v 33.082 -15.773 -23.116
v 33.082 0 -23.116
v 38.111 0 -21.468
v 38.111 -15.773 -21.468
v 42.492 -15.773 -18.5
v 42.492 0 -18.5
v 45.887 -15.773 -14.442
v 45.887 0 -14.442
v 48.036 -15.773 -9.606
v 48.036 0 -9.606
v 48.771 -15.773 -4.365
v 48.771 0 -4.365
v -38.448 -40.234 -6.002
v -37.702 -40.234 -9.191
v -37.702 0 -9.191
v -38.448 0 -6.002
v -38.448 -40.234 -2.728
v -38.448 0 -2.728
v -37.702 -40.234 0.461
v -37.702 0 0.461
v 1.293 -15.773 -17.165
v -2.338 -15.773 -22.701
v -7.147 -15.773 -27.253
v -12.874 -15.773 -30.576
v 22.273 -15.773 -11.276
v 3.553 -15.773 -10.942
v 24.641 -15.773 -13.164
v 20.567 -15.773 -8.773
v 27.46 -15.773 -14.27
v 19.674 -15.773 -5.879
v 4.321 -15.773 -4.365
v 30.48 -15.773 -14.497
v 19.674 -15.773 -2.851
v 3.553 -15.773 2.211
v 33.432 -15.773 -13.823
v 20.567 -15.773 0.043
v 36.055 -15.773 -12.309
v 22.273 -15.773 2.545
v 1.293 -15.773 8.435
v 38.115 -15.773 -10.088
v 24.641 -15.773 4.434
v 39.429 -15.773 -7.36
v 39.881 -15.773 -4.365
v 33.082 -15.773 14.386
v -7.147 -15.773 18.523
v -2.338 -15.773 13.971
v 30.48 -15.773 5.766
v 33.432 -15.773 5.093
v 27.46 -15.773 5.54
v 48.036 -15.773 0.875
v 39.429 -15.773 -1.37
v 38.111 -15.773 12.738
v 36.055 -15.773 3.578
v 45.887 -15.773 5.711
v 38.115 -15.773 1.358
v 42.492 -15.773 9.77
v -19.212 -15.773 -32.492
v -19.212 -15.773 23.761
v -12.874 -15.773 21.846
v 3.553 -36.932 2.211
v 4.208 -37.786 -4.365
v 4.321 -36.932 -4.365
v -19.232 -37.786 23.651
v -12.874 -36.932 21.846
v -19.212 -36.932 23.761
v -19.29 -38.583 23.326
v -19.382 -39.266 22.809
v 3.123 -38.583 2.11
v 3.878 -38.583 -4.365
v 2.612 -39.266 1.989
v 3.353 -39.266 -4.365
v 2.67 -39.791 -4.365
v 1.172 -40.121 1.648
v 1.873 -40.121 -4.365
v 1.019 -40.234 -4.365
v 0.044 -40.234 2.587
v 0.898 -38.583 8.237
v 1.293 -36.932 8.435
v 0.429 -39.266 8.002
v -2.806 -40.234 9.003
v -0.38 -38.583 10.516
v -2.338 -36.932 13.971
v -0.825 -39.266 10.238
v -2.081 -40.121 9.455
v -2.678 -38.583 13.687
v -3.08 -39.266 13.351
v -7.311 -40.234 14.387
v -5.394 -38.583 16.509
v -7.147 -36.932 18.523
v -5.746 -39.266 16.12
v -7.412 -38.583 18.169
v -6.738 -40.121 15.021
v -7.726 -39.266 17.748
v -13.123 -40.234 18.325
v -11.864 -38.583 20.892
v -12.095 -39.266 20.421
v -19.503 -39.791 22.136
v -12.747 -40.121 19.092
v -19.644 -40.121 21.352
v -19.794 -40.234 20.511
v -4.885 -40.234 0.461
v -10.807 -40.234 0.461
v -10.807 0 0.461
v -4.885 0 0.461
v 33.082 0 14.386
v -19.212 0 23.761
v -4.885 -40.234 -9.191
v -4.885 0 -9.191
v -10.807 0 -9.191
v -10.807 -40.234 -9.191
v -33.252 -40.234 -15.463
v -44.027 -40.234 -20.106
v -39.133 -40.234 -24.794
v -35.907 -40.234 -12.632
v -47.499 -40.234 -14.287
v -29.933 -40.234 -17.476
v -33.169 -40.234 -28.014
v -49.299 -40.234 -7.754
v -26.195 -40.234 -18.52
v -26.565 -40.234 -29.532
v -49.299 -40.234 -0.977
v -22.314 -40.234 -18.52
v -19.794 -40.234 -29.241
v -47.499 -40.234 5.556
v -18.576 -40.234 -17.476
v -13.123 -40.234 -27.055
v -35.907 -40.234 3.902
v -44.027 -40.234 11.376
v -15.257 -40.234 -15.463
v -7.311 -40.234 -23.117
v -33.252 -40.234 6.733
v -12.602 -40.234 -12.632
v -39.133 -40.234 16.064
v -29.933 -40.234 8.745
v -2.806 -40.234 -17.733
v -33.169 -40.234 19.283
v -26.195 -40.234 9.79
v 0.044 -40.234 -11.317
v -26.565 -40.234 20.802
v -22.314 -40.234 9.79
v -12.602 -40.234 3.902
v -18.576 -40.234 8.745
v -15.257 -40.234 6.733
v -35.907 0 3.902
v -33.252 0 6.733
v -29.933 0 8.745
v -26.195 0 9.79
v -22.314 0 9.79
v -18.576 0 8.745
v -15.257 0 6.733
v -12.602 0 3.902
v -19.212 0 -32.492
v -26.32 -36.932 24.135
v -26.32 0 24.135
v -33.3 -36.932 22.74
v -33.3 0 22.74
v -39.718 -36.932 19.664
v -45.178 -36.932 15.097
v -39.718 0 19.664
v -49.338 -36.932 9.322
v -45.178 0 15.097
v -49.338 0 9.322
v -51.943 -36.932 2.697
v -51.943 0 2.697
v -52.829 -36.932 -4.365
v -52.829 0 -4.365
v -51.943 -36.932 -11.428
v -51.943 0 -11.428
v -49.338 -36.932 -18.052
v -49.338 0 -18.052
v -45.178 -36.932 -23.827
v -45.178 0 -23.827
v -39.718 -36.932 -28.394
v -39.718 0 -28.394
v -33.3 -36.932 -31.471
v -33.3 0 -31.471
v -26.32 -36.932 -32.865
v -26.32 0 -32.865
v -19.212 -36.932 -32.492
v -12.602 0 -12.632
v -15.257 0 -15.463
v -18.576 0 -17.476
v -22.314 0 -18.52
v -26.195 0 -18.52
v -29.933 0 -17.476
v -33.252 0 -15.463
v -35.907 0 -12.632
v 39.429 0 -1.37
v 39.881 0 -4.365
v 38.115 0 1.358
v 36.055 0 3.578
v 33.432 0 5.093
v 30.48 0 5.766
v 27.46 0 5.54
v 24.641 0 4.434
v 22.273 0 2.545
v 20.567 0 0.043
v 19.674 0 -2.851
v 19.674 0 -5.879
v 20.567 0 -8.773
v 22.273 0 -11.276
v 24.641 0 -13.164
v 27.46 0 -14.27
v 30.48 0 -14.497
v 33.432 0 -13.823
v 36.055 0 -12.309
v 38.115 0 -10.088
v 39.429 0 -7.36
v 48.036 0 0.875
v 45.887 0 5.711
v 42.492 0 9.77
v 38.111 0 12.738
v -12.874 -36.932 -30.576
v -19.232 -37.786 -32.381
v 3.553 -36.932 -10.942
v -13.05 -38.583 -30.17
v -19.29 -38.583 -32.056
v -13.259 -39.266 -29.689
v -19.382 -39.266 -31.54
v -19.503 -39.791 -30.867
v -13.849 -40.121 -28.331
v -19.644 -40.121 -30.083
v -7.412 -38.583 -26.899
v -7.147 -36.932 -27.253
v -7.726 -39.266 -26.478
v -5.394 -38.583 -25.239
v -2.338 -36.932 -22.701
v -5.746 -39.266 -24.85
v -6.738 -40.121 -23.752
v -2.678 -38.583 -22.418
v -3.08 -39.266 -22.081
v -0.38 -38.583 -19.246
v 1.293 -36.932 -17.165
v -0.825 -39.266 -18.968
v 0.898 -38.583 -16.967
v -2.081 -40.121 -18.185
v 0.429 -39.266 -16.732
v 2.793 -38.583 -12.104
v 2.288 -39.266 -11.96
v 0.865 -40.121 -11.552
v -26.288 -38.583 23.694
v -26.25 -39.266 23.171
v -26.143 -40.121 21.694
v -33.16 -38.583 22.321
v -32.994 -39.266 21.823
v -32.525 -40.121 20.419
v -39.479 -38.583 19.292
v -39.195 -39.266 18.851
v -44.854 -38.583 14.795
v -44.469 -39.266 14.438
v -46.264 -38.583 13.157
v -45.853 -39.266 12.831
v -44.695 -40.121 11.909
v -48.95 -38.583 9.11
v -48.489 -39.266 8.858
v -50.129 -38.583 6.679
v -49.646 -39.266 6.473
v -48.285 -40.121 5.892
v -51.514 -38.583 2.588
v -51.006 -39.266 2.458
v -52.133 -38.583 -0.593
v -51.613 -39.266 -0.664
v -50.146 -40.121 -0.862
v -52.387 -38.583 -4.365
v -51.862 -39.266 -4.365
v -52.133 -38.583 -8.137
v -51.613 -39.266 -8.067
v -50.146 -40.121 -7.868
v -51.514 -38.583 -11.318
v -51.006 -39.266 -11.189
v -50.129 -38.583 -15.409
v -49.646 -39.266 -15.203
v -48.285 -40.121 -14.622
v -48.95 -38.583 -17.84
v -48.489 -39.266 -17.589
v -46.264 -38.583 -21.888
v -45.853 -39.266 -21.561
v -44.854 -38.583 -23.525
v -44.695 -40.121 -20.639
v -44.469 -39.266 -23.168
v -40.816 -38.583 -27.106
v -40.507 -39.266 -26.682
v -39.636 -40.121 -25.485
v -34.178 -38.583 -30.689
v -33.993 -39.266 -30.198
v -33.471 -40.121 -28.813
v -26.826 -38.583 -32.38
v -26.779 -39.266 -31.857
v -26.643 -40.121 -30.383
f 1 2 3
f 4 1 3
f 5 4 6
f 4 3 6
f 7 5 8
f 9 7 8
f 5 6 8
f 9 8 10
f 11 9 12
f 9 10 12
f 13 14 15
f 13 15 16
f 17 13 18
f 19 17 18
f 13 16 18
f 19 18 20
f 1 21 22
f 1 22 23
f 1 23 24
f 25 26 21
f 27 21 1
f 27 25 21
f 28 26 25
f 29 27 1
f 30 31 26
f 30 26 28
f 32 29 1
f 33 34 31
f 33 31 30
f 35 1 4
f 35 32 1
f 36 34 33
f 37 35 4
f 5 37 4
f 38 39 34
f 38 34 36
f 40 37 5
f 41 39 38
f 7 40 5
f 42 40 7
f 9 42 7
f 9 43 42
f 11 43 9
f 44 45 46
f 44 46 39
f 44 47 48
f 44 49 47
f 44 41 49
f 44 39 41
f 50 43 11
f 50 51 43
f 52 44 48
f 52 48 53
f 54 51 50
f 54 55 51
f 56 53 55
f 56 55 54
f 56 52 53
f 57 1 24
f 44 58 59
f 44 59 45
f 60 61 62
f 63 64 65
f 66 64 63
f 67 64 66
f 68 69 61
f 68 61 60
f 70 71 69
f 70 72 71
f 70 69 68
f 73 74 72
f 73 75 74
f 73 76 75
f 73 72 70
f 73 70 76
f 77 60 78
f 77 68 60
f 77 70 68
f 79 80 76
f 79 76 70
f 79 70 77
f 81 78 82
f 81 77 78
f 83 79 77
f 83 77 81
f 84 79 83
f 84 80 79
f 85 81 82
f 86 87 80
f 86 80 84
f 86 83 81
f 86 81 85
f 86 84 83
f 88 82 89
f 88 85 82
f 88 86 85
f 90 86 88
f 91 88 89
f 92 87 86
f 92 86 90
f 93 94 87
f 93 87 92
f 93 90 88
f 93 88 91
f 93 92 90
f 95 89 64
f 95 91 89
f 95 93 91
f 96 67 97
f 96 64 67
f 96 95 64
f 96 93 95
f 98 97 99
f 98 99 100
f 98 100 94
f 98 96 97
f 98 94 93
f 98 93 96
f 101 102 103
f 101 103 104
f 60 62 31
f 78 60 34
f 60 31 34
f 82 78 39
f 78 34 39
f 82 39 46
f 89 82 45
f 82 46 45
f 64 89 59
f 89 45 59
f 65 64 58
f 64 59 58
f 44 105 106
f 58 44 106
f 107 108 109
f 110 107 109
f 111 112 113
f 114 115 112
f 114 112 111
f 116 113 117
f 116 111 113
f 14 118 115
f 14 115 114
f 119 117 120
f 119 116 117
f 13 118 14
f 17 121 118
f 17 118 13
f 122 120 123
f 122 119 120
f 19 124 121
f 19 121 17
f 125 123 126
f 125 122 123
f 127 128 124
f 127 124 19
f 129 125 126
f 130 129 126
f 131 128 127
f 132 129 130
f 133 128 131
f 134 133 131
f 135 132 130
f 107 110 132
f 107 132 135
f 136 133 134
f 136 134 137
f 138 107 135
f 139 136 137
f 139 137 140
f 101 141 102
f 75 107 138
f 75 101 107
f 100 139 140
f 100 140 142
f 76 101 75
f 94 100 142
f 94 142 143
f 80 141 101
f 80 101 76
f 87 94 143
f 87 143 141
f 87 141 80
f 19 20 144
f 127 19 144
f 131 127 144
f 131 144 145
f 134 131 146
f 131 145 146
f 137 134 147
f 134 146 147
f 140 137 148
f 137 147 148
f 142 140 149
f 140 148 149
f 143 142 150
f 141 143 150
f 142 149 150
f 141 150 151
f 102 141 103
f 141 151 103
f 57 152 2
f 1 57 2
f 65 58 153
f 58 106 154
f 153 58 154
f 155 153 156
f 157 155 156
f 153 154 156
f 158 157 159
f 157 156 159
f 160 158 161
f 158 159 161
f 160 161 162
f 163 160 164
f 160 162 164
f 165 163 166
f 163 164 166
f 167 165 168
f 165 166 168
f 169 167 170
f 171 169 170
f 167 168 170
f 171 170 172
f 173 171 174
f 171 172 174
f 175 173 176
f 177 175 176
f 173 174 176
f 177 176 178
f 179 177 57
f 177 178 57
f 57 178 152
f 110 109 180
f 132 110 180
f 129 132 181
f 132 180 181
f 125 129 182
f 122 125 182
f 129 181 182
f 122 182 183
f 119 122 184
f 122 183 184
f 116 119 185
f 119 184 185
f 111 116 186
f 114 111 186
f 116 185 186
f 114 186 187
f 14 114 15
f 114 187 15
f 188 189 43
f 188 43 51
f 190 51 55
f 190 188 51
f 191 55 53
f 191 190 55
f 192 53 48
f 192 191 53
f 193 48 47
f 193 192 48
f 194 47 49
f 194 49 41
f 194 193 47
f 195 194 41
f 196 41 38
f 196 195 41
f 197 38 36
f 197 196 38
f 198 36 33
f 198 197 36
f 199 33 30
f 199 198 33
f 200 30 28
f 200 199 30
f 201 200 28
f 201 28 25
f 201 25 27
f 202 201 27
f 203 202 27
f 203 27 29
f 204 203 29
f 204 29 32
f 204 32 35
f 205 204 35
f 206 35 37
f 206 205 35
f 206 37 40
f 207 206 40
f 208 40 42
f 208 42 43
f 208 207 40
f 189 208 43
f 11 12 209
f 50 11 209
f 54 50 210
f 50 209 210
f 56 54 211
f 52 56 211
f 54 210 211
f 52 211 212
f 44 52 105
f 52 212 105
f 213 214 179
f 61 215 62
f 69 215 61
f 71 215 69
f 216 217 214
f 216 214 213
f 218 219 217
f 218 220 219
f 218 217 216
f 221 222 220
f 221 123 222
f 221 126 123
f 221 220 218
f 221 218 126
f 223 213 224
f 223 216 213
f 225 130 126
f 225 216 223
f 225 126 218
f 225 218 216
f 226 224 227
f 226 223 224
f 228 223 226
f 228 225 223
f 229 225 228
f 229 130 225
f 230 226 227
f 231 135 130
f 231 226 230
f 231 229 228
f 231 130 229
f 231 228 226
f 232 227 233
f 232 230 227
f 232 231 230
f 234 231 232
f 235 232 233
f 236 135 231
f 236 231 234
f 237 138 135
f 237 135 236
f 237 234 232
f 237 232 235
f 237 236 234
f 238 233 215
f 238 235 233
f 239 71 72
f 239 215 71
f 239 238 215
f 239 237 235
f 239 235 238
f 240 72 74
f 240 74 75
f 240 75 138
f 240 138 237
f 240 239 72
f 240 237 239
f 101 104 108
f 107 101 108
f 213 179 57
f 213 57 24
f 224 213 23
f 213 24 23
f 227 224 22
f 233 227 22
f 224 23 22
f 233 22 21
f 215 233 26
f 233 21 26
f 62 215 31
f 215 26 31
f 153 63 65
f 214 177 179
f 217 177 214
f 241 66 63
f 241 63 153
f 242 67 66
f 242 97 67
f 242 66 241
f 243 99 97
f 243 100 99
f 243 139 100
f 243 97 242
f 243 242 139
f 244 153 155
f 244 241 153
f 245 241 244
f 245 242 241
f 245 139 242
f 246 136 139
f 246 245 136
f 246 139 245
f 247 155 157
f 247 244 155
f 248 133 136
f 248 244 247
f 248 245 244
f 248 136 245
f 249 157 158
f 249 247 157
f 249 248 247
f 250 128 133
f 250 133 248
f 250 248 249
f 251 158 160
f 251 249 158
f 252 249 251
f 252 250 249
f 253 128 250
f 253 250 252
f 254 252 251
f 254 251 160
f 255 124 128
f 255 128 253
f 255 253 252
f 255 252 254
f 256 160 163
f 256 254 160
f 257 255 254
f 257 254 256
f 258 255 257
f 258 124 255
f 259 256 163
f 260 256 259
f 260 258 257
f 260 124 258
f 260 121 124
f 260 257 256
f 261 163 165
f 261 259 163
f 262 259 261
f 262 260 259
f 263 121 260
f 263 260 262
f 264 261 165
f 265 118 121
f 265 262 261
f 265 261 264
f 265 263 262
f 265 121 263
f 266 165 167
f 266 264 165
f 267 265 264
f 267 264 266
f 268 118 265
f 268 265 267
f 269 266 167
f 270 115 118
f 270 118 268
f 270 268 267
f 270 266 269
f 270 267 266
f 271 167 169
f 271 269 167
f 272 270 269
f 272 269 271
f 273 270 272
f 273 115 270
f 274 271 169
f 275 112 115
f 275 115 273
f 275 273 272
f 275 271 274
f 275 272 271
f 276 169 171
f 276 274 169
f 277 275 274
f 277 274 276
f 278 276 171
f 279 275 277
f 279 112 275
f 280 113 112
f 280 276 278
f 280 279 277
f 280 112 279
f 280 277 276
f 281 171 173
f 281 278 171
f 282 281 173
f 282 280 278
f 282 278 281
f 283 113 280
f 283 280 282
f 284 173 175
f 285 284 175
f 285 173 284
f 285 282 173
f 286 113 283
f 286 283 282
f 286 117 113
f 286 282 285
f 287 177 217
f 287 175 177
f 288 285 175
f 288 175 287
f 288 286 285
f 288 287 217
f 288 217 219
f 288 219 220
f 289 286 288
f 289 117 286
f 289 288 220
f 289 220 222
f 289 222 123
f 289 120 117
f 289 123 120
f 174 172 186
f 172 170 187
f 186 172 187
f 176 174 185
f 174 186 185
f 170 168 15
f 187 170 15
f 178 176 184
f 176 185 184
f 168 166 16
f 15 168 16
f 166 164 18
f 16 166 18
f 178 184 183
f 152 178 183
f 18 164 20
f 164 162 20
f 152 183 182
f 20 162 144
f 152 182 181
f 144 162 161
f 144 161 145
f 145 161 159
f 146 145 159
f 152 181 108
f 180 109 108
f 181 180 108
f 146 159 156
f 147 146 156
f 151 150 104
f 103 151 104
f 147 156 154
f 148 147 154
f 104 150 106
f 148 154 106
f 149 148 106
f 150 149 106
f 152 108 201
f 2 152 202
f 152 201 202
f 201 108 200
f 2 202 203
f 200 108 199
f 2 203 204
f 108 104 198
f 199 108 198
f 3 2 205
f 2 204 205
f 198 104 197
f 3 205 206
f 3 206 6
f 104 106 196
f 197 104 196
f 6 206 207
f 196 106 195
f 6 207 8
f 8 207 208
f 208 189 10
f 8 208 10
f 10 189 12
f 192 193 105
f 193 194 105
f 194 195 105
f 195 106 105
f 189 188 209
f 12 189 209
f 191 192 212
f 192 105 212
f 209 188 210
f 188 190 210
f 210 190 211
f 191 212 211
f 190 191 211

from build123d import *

# Parameters (mm, degrees)
F1_DEPTH = 40.2336
F0_R     = 10.16
F2_DEPTH = 15.7734
F3_R     = 3.302


with BuildPart() as f1:
    # F0 (on Front) → F1 (new body)
    with BuildSketch(Plane.XZ):
        with BuildLine():
            ThreePointArc((-19.211791, -32.491654), (-2.338414, -22.701375), (4.320562, -4.365113))
            ThreePointArc((4.320562, -4.365113), (-2.338414, 13.971149), (-19.211791, 23.761429))
            ThreePointArc((-19.211791, 23.761429), (-52.829438, -4.365113), (-19.211791, -32.491654))
        make_face()
        with BuildLine():
            ThreePointArc((-37.702203, -9.191113), (-38.541938, -4.365113), (-37.702203, 0.460887))
            ThreePointArc((-37.702203, 0.460887), (-24.254438, 9.922387), (-10.806673, 0.460887))
            Line((-10.806673, 0.460887), (-4.885403, 0.460887))
            Line((-4.885403, 0.460887), (-4.885403, -9.191113))
            Line((-4.885403, -9.191113), (-10.806673, -9.191113))
            ThreePointArc((-10.806673, -9.191113), (-24.254438, -18.652613), (-37.702203, -9.191113))
        make_face(mode=Mode.SUBTRACT)
    extrude(amount=F1_DEPTH)

    # F0 (on Front) → F2 (join)
    with BuildSketch(Plane.XZ):
        with BuildLine():
            ThreePointArc((-19.211791, 23.761429), (-2.338414, 13.971149), (4.320562, -4.365113))
            ThreePointArc((4.320562, -4.365113), (-2.338414, -22.701375), (-19.211791, -32.491654))
            Line((-19.211791, -32.491654), (33.082327, -23.116141))
            ThreePointArc((33.082327, -23.116141), (10.670562, -4.365113), (33.082327, 14.385915))
            Line((33.082327, 14.385915), (-19.211791, 23.761429))
        make_face()
        with BuildLine():
            ThreePointArc((48.770562, -4.365113), (44.331245, 7.859062), (33.082327, 14.385915))
            ThreePointArc((33.082327, 14.385915), (10.670562, -4.365113), (33.082327, -23.116141))
            ThreePointArc((33.082327, -23.116141), (44.331245, -16.589287), (48.770562, -4.365113))
        make_face()
        with Locations((29.720562, -4.365113)):
            Circle(F0_R, mode=Mode.SUBTRACT)
    extrude(amount=F2_DEPTH)

    # F3
    f3_edges = [f1.edges().sort_by_distance(p)[0] for p in [
        (-29.297085, -40.2336, 23.761429),
    ]]
    fillet(f3_edges, radius=F3_R)


solid = f1.part
